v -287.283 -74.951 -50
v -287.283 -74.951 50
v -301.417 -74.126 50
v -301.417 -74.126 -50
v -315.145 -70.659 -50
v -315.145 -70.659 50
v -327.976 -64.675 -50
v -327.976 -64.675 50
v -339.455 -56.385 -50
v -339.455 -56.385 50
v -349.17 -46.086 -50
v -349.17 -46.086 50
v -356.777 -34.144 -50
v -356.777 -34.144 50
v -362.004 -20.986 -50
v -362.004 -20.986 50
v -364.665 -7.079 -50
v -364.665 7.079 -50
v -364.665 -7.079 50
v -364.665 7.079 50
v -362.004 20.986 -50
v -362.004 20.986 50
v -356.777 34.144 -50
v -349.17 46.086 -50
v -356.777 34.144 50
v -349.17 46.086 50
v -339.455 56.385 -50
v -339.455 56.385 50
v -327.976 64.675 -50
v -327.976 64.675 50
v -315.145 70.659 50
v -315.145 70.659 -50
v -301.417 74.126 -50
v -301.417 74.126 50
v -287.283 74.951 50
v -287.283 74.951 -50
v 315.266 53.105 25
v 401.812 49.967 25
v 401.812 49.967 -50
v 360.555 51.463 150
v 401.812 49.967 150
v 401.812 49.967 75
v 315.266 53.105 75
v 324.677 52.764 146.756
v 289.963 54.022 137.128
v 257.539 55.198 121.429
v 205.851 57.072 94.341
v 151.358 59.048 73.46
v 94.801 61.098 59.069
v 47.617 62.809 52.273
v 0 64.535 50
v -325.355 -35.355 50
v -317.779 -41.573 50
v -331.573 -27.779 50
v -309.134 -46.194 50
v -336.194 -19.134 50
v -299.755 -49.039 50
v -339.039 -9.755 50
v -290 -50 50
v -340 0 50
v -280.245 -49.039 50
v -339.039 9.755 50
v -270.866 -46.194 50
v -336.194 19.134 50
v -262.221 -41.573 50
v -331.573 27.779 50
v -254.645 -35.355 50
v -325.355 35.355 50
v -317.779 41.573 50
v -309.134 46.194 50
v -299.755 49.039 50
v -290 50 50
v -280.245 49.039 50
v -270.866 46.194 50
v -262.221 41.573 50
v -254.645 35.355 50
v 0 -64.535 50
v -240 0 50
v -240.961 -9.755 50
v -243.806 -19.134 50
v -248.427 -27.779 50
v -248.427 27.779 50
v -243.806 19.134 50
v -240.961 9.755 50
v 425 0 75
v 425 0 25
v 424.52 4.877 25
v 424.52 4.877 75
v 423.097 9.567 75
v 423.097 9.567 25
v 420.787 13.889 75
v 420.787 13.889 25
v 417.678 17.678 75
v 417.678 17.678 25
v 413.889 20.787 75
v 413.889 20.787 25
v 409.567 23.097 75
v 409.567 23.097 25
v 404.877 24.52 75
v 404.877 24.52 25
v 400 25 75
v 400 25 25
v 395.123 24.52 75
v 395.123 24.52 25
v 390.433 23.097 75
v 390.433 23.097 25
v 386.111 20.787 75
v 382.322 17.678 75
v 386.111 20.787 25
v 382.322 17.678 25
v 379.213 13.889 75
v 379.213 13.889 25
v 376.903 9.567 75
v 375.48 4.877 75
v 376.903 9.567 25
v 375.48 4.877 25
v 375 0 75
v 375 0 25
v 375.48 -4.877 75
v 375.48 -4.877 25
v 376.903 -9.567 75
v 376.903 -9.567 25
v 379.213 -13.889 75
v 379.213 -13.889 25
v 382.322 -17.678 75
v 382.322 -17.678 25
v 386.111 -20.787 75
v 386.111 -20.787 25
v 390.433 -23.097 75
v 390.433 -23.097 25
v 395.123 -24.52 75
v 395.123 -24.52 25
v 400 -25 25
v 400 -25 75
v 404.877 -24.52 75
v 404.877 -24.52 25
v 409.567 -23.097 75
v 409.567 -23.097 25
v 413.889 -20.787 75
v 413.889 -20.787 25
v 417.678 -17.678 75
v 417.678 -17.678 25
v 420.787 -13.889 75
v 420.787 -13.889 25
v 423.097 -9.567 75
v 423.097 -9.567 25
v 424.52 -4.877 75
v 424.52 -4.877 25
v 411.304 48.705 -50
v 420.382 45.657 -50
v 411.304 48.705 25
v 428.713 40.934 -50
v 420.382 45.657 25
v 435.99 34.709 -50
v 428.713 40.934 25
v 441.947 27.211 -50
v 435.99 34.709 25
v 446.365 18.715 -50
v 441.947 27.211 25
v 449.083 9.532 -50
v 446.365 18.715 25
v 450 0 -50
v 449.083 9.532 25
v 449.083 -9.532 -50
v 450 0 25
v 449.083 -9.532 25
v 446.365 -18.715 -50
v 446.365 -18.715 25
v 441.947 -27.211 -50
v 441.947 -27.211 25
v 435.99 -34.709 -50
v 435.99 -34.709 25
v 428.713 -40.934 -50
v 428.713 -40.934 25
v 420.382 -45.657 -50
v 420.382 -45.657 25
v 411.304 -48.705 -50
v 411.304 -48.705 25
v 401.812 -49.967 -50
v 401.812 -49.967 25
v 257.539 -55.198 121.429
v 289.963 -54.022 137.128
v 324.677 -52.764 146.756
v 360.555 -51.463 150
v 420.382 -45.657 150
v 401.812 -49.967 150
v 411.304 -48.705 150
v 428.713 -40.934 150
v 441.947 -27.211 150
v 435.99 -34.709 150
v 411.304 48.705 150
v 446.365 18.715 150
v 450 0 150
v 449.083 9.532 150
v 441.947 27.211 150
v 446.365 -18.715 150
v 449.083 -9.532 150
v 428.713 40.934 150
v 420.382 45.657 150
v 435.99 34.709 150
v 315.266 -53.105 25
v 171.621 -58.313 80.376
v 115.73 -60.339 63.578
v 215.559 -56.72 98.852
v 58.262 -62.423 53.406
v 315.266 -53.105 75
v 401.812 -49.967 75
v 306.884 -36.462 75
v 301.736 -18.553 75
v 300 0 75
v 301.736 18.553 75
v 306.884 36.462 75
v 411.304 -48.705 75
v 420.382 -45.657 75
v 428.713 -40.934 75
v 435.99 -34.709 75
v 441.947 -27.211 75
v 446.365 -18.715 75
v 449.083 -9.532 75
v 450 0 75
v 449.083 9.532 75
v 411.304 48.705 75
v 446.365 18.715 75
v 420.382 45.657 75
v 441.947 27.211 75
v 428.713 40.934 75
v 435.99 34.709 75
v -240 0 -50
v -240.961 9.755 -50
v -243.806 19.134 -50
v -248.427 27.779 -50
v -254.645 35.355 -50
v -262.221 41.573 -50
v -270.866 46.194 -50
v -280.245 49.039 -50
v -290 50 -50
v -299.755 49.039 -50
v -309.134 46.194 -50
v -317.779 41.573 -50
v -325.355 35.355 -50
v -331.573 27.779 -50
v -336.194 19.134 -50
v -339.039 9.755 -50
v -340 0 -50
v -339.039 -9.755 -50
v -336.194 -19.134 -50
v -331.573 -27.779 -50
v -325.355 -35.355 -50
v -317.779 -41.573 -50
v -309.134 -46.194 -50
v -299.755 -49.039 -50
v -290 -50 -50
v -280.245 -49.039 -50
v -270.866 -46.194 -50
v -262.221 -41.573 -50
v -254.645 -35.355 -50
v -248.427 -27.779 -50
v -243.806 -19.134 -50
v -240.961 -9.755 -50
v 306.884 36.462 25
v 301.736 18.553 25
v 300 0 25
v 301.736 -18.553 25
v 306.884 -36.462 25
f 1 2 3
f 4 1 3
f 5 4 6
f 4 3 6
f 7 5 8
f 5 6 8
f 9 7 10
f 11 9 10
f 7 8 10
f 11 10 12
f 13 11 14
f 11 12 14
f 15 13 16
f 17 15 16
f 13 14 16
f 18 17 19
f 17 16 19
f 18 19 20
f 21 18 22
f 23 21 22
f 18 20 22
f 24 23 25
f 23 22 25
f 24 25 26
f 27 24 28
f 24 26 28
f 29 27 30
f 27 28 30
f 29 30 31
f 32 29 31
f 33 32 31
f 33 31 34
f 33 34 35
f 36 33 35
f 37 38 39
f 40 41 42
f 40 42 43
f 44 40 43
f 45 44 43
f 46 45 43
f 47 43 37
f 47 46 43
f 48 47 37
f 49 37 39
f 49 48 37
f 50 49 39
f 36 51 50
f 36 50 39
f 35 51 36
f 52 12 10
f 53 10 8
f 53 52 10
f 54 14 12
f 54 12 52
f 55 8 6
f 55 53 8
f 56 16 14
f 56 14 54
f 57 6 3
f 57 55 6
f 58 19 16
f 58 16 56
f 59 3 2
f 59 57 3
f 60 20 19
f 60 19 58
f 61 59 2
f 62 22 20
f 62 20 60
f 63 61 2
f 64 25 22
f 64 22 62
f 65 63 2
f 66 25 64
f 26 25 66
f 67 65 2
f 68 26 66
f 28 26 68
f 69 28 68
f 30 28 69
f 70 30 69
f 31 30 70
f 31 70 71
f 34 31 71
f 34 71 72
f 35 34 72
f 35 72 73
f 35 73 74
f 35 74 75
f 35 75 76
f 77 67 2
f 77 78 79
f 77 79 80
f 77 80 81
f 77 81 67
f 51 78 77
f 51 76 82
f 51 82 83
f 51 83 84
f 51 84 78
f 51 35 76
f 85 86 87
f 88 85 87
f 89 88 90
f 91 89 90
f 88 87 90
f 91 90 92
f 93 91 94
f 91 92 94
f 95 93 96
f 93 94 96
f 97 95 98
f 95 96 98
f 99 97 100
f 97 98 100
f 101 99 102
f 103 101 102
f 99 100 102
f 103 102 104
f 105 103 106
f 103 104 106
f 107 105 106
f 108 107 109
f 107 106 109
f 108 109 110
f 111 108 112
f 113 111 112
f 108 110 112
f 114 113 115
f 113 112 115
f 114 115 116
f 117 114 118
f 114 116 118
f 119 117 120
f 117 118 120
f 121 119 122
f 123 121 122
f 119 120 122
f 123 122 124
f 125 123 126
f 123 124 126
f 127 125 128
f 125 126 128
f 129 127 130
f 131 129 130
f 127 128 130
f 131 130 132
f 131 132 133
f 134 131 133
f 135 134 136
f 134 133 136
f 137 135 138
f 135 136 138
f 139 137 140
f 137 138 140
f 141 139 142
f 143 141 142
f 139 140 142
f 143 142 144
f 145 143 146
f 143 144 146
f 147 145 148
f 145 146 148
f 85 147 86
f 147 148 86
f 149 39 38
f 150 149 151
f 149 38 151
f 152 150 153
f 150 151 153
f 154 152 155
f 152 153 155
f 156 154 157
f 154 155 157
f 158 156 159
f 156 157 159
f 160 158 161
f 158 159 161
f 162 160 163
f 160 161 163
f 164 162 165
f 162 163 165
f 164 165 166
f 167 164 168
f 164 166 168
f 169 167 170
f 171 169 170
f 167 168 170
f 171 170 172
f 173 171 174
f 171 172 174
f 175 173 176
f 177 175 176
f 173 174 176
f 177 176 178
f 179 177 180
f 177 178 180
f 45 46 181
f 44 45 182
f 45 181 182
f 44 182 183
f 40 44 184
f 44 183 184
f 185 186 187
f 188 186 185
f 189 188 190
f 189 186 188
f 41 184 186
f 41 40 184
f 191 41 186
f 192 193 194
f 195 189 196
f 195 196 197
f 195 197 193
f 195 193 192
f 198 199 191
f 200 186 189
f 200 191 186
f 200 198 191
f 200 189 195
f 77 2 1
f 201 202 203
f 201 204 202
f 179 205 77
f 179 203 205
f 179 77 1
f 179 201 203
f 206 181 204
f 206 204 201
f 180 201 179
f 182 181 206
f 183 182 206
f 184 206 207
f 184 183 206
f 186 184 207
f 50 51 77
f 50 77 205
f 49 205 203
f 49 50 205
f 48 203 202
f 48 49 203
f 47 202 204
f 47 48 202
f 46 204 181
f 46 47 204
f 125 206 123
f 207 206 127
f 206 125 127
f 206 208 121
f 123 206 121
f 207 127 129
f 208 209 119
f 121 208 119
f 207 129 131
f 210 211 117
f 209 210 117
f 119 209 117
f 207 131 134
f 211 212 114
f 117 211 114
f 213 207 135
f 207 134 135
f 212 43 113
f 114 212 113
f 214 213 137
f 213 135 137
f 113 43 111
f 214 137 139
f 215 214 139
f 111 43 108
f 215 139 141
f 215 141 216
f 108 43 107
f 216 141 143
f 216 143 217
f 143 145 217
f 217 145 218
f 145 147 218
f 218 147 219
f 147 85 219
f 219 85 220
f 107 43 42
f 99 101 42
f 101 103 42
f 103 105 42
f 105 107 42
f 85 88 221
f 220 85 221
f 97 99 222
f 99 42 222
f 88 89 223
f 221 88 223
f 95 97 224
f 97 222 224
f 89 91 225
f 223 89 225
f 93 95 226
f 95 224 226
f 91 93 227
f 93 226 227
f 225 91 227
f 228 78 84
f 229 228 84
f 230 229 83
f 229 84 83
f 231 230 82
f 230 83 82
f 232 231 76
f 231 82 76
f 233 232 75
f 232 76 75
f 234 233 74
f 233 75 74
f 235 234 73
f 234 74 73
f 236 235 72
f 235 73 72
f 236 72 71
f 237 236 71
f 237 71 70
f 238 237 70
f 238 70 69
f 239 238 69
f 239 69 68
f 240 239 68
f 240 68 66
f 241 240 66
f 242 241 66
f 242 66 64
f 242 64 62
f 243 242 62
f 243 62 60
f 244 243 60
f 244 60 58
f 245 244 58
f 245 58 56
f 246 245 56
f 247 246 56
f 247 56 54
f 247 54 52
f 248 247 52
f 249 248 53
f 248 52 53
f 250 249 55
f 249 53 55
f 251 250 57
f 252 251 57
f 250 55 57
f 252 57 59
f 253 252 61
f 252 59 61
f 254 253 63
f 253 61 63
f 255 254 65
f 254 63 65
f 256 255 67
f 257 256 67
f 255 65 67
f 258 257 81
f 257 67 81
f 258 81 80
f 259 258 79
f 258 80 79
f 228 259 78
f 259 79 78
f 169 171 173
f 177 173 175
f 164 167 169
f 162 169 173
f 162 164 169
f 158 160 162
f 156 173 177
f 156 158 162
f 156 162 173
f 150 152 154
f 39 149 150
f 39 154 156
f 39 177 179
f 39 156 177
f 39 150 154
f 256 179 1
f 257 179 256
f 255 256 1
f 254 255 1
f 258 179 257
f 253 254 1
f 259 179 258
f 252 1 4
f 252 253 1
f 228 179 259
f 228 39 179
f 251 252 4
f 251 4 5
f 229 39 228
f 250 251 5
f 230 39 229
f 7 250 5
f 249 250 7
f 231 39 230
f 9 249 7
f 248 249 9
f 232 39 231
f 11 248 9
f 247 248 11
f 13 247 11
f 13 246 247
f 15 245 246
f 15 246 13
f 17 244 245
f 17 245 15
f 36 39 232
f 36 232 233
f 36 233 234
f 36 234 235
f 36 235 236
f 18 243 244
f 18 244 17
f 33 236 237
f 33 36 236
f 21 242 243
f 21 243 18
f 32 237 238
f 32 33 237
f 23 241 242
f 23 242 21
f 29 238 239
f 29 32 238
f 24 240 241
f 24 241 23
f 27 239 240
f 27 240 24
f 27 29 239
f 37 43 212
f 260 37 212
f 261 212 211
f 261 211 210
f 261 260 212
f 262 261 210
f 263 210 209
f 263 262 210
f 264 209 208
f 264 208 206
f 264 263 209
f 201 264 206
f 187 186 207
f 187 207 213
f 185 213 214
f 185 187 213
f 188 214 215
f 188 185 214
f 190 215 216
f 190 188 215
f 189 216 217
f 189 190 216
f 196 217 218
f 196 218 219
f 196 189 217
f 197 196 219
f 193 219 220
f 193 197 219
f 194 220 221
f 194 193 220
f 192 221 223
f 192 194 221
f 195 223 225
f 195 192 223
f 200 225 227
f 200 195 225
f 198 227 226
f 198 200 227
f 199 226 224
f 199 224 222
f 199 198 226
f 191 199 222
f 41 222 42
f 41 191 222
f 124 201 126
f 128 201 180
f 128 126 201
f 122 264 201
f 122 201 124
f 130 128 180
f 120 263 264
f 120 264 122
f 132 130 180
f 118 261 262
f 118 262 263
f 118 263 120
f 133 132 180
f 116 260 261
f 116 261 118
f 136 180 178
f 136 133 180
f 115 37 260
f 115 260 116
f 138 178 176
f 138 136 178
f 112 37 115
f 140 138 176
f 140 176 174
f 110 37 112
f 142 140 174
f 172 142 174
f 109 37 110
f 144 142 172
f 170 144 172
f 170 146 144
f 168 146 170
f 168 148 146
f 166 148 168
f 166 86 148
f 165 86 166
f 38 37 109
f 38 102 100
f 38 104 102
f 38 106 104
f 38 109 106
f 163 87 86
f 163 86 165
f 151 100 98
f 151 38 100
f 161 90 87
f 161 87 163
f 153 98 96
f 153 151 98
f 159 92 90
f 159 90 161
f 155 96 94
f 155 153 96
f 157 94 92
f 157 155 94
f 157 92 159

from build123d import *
from build123d.topology import SkipClean

# Parameters (mm, degrees)
SKETCH2_R                      = 50
BOSS_EXTRUDE1_DEPTH            = 50
BOSS_EXTRUDE4_START            = 100
SKETCH6_R                      = 50
BOSS_EXTRUDE4_DEPTH            = 100
CUT_EXTRUDE1_DEPTH             = 25
CUT_EXTRUDE1_DEPTH_BACK        = 25
CUT_EXTRUDE1_START             = 50
SKETCH8_R                      = 100
SKETCH8_R_2                    = 25
CUT_EXTRUDE2_REACH             = 482.234
CUT_EXTRUDE2_DIRECTION_2_REACH = 482.234
FILLET1_R                      = 200


with BuildPart() as part:
    # Sketch2 → Boss-Extrude1 (new, symmetric)
    with BuildSketch(Plane.XY):
        with BuildLine():
            Line((-287.282608696, 74.95075573), (401.811594203, 49.967170487))
            ThreePointArc((401.811594203, 49.967170487), (450, 0), (401.811594203, -49.967170487))
            Line((401.811594203, -49.967170487), (-287.282608696, -74.95075573))
            ThreePointArc((-287.282608696, -74.95075573), (-365, 0), (-287.282608696, 74.95075573))
        make_face()
        with Locations((-290, 0)):
            Circle(SKETCH2_R, mode=Mode.SUBTRACT)
    extrude(amount=BOSS_EXTRUDE1_DEPTH, both=True)

    # Sketch6 → Boss-Extrude4 (add)
    with SkipClean():  # the faces are left unmerged after this step: merging them gives an invalid solid
        with BuildSketch(Plane.XY.offset(50).offset(BOSS_EXTRUDE4_START)):
            with BuildLine():
                Line((-287.282608696, -74.95075573), (401.811594203, -49.967170487))
                ThreePointArc((401.811594203, -49.967170487), (450, 0), (401.811594203, 49.967170487))
                Line((401.811594203, 49.967170487), (-287.282608696, 74.95075573))
                ThreePointArc((-287.282608696, 74.95075573), (-365, 0), (-287.282608696, -74.95075573))
            make_face()
            with Locations((-290, 0)):
                Circle(SKETCH6_R, mode=Mode.SUBTRACT)
        extrude(amount=-BOSS_EXTRUDE4_DEPTH)

    # Sketch8 → Cut-Extrude1 (cut, two sides: drawn at the far end of the back side and taken through both)
    with SkipClean():  # the faces are left unmerged after this step: merging them gives an invalid solid
        with BuildSketch(Plane.XY.offset(CUT_EXTRUDE1_START - CUT_EXTRUDE1_DEPTH_BACK)):
            with Locations((400, 0)):
                Circle(SKETCH8_R)
            with Locations((400, 0)):
                Circle(SKETCH8_R_2, mode=Mode.SUBTRACT)
        extrude(amount=CUT_EXTRUDE1_DEPTH + CUT_EXTRUDE1_DEPTH_BACK, mode=Mode.SUBTRACT)

    # Sketch9 → Cut-Extrude2 (cut, up to next)
    with BuildSketch(Plane(origin=(0, 0, 0), x_dir=(1, 0, 0), z_dir=(0, 1, 0)), mode=Mode.PRIVATE) as cut_extrude2_sk1:
        with BuildLine():
            Line((-365, -50), (0, -50))
            ThreePointArc((0, -50), (158.113883008, -75.658350975), (300, -150))
            Line((300, -150), (-365, -150))
            Line((-365, -150), (-365, -50))
        make_face()
    cut_extrude2_tool1 = extrude(cut_extrude2_sk1.sketch, amount=-CUT_EXTRUDE2_REACH, mode=Mode.PRIVATE) & part.part
    add(cut_extrude2_tool1.solids().sort_by_distance((-76.011524, 0, 103.458826))[0], mode=Mode.SUBTRACT)

    # Sketch9 → Cut-Extrude2 direction 2 (cut, up to next)
    with BuildSketch(Plane(origin=(0, 0, 0), x_dir=(1, 0, 0), z_dir=(0, 1, 0)), mode=Mode.PRIVATE) as cut_extrude2_direction_2_sk1:
        with BuildLine():
            Line((-365, -50), (0, -50))
            ThreePointArc((0, -50), (158.113883008, -75.658350975), (300, -150))
            Line((300, -150), (-365, -150))
            Line((-365, -150), (-365, -50))
        make_face()
    cut_extrude2_direction_2_tool1 = extrude(cut_extrude2_direction_2_sk1.sketch, amount=CUT_EXTRUDE2_DIRECTION_2_REACH, mode=Mode.PRIVATE) & part.part
    add(cut_extrude2_direction_2_tool1.solids().sort_by_distance((-76.011524, 0, 103.458826))[0], mode=Mode.SUBTRACT)

    # Fillet1
    fillet1_edges = [part.edges().sort_by_distance(p)[0] for p in [
        (300, 0, 150),
    ]]
    fillet(fillet1_edges, radius=FILLET1_R)


solid = part.part
